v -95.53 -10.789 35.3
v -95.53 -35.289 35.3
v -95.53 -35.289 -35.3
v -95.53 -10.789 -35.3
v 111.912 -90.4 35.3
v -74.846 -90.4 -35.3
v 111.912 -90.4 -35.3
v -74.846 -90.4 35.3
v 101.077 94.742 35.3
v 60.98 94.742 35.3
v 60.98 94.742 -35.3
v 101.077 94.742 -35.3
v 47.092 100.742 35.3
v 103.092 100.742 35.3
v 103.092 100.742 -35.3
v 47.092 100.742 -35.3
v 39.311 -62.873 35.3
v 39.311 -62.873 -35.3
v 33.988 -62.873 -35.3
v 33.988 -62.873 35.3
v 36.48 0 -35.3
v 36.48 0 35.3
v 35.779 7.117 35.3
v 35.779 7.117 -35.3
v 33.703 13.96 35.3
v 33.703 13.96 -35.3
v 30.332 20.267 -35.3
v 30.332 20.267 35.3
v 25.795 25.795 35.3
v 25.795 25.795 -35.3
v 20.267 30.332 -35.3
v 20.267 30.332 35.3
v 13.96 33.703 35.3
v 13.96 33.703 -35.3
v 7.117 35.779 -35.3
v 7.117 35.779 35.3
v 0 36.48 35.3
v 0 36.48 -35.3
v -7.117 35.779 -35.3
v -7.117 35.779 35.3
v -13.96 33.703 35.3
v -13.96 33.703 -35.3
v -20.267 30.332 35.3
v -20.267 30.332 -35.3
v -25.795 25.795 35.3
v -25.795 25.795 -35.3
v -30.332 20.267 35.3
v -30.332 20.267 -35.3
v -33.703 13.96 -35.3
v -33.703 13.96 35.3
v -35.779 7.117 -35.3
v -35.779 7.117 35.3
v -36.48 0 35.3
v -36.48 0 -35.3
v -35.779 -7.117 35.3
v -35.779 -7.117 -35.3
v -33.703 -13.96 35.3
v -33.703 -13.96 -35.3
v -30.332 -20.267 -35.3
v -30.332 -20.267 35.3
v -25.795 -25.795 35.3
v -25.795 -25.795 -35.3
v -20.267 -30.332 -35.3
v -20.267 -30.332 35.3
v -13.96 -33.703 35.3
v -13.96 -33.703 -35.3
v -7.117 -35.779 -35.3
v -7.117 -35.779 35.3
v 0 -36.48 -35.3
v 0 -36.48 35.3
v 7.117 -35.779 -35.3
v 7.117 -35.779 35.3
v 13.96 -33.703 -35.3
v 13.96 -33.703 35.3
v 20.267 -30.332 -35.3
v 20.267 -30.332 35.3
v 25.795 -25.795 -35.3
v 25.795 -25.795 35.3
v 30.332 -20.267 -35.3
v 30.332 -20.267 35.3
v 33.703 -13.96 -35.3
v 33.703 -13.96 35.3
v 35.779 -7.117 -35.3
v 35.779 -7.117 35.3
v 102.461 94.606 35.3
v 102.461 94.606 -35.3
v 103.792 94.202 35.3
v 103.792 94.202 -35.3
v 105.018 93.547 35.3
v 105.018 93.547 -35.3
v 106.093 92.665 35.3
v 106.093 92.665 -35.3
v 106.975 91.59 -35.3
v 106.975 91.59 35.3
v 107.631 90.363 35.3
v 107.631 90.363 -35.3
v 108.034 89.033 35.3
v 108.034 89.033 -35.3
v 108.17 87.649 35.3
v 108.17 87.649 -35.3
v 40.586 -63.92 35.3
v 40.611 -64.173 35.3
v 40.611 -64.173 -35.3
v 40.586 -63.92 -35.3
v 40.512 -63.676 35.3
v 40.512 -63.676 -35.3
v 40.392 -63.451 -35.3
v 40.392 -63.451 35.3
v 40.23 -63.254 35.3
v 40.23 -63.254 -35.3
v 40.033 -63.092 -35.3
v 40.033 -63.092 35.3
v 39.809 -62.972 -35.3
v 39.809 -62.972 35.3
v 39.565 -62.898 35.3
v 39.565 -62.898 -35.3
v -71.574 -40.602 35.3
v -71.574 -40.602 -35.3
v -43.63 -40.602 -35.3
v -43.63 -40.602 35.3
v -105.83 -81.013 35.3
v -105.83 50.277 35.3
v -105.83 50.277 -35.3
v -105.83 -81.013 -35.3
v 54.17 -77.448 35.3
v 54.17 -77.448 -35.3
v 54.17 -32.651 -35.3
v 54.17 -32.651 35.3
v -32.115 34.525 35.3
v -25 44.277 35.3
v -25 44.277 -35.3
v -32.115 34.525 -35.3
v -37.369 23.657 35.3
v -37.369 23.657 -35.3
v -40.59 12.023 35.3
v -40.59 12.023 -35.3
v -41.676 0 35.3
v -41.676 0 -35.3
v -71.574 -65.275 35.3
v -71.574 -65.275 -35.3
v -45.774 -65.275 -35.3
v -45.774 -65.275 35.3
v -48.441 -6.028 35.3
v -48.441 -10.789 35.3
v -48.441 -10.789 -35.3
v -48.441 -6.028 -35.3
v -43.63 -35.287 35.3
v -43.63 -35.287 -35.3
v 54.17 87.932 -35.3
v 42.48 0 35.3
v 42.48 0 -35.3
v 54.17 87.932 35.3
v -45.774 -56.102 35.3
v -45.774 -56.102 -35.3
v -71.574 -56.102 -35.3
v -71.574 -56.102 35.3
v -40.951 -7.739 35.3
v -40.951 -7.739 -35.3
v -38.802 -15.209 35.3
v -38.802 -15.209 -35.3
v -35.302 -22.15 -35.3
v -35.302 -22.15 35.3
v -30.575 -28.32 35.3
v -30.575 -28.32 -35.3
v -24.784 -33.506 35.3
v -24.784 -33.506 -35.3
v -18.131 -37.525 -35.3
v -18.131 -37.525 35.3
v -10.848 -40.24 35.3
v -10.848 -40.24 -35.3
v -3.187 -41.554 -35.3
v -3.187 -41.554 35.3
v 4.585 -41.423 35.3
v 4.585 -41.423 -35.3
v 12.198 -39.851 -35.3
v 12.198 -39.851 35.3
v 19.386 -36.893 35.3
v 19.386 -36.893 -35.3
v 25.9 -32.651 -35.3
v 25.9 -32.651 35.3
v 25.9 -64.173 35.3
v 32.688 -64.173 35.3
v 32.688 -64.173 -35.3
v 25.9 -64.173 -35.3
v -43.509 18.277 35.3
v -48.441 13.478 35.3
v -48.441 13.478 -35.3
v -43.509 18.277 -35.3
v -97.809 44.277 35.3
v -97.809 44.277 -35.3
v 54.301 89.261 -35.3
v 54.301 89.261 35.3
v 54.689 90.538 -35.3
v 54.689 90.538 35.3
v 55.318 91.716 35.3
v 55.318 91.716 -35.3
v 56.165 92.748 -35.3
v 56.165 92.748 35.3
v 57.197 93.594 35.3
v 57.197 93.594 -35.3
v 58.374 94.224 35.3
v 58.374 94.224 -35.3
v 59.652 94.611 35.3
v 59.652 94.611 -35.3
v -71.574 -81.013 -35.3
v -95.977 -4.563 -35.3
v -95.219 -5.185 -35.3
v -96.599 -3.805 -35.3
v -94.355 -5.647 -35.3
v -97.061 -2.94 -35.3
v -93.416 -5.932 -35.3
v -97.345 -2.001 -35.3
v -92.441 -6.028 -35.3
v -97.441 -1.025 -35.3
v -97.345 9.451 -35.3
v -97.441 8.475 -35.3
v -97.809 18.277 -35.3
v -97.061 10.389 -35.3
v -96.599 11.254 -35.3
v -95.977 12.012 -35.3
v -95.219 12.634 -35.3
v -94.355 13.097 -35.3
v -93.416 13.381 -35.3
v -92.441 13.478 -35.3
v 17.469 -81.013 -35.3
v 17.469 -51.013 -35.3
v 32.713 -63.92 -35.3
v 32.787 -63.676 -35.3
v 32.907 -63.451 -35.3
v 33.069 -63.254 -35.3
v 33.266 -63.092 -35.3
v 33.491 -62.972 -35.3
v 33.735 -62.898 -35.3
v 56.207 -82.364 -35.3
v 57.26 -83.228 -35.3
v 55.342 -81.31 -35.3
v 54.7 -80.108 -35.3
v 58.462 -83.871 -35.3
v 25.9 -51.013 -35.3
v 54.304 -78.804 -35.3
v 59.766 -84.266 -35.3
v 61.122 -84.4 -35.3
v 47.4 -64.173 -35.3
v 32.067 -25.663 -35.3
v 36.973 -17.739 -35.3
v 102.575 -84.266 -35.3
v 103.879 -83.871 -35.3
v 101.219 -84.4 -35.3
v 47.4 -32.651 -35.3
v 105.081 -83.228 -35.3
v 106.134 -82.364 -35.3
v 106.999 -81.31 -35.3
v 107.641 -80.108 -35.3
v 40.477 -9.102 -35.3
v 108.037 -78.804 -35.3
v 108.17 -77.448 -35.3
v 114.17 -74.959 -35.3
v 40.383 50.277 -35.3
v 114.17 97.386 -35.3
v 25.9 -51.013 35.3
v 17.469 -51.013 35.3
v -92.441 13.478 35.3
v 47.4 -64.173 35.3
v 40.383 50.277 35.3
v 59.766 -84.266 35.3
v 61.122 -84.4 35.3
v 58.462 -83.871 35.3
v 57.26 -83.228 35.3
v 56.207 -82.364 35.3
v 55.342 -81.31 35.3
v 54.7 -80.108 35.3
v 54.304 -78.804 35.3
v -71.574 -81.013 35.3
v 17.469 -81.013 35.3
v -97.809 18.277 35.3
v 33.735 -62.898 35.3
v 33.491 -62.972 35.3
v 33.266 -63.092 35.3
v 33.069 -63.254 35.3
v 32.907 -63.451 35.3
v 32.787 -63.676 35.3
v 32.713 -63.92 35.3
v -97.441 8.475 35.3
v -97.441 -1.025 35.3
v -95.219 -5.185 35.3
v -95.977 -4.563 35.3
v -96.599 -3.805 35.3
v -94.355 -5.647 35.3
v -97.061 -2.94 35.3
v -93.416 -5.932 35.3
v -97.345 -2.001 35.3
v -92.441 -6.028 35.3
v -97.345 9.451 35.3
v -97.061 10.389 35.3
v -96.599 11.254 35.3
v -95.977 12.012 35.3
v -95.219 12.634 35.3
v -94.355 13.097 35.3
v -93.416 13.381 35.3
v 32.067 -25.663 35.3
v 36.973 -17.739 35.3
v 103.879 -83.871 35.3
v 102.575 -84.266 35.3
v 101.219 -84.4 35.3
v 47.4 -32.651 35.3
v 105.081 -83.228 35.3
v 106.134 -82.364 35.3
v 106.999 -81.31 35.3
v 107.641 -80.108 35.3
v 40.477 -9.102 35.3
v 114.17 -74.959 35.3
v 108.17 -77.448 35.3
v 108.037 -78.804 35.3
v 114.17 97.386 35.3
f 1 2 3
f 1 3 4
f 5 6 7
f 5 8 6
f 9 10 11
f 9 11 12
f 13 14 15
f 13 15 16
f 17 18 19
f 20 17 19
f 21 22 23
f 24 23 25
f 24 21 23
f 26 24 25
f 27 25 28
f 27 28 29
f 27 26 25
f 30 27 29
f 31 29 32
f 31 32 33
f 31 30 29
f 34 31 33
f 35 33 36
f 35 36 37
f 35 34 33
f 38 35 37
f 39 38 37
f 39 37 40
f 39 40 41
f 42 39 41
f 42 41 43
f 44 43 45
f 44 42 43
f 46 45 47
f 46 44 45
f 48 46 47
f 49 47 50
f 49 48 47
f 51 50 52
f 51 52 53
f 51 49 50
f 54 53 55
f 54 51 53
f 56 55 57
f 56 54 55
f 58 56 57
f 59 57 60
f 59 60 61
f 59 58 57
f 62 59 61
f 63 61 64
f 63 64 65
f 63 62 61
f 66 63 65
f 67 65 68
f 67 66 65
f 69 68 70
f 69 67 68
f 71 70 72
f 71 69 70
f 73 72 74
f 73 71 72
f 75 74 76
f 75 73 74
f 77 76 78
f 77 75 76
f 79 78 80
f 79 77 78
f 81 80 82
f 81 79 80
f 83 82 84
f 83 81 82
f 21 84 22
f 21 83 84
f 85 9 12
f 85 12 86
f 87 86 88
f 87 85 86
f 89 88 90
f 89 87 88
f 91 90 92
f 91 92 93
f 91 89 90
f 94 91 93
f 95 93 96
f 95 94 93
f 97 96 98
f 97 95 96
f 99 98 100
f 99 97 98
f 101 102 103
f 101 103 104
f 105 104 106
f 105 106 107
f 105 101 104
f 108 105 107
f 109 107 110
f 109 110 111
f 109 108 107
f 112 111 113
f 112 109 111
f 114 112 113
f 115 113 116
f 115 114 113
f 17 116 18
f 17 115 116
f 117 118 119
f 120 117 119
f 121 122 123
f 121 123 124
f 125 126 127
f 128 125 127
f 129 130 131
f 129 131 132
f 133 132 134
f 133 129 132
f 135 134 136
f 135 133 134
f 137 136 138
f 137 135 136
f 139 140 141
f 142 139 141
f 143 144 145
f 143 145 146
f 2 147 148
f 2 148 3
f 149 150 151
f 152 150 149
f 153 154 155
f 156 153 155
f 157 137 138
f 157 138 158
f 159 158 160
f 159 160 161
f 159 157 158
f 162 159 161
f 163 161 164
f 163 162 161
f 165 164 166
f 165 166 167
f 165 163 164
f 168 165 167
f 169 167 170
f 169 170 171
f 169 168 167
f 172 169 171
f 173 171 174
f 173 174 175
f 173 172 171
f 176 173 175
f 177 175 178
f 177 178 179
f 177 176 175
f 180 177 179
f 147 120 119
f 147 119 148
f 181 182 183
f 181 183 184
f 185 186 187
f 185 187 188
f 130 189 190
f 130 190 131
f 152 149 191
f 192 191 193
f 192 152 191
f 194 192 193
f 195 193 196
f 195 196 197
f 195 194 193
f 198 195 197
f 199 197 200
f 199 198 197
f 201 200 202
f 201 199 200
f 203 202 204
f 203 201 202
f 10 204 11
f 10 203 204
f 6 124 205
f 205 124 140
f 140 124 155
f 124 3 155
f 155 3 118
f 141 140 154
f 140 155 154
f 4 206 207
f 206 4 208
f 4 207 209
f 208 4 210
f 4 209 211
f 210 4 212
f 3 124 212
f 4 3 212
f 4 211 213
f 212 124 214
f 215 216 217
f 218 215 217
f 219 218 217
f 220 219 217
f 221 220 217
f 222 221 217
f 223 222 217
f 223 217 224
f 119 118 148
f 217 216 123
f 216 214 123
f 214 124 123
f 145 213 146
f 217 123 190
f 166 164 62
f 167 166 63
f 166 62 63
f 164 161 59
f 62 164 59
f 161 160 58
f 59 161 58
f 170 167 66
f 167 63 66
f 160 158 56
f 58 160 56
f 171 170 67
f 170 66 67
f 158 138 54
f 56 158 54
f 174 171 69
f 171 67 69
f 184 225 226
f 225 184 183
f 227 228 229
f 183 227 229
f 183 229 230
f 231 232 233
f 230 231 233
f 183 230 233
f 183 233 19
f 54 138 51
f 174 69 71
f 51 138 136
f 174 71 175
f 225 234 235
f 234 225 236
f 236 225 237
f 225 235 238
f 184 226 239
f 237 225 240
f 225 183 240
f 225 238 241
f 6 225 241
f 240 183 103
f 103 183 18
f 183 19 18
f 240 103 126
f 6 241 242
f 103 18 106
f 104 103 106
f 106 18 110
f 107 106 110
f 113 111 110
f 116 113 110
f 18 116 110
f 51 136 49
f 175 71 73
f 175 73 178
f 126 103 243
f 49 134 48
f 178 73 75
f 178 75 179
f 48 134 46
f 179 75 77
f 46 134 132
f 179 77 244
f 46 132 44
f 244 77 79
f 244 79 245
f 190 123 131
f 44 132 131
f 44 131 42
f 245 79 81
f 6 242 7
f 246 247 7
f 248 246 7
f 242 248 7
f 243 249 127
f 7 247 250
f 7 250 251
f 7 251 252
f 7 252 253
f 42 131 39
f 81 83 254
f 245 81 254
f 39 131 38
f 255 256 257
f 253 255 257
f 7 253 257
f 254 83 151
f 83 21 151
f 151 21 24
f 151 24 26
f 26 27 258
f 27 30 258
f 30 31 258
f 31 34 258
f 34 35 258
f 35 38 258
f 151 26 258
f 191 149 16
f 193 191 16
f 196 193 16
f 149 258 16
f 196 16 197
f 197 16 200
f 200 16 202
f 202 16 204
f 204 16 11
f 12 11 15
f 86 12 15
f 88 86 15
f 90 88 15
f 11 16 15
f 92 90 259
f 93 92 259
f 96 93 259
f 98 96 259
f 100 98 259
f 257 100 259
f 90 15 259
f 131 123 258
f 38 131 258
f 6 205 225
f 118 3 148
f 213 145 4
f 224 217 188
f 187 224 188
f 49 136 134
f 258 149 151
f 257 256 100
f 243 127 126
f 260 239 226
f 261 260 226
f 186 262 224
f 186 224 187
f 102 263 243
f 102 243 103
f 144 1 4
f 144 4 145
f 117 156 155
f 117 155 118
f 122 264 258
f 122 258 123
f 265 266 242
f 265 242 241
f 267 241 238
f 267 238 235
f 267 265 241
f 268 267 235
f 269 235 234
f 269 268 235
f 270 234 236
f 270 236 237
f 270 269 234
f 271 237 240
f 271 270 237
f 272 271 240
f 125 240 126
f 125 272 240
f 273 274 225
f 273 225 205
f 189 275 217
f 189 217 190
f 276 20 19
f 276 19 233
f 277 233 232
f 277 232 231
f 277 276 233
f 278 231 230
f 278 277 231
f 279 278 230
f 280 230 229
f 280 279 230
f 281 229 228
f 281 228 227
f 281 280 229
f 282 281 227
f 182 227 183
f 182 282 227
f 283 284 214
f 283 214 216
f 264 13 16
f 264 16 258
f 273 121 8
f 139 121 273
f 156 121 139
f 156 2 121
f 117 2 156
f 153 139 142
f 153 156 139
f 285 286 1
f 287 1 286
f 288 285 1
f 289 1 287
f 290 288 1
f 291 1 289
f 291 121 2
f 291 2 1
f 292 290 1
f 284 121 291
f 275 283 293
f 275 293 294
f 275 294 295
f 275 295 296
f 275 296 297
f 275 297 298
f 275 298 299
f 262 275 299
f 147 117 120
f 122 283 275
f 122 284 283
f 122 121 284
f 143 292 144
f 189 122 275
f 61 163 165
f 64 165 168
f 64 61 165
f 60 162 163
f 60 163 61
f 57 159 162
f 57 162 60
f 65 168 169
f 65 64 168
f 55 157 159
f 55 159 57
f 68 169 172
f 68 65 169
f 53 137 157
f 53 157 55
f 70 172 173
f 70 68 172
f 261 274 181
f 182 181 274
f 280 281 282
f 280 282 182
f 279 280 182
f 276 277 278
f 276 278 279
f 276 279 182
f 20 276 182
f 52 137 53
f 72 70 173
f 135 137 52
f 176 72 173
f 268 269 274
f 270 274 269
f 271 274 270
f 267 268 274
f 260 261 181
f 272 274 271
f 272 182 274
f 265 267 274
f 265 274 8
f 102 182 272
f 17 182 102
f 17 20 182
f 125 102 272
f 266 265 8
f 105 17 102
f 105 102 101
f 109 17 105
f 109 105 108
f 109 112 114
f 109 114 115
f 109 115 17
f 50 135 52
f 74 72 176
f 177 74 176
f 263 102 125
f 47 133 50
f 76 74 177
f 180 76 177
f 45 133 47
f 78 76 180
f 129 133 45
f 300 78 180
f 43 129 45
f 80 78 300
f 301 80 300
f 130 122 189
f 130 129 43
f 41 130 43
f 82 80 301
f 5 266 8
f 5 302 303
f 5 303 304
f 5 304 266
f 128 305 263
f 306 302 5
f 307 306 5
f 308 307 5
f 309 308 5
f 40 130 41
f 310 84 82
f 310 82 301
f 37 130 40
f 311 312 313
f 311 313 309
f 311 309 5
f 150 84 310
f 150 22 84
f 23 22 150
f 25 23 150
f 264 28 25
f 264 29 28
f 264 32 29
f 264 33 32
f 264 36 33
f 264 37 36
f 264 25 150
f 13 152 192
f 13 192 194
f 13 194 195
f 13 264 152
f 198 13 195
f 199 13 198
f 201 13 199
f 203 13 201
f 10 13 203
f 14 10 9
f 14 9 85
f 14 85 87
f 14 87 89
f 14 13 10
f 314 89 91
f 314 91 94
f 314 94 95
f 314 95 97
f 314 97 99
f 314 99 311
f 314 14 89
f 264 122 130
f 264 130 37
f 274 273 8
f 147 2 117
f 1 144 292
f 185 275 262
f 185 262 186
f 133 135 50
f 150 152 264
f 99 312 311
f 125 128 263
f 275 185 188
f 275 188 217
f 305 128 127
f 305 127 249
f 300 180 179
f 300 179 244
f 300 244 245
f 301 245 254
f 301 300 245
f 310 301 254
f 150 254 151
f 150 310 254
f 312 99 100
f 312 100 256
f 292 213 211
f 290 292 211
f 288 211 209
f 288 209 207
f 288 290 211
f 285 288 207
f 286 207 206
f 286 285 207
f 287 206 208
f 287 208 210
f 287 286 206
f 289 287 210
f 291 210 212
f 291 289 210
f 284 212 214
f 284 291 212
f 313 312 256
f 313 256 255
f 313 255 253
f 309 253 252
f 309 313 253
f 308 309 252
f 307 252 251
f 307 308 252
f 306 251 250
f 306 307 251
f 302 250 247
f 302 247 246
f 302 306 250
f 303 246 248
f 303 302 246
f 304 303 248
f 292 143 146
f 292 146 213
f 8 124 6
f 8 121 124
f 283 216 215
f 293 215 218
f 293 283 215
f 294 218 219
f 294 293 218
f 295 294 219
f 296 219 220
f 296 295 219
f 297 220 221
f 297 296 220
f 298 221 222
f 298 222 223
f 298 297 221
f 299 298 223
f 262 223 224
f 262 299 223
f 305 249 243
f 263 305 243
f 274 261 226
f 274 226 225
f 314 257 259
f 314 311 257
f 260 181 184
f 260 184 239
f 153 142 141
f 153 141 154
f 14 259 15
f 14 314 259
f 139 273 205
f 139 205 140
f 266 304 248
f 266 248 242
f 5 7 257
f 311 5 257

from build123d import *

# Parameters (mm, degrees)
CROQUIS1_R              = 36.48
SALIENTE_EXTRUIR1_DEPTH = 35.3


with BuildPart() as part:
    # Croquis1 → Saliente-Extruir1 (new, symmetric)
    with BuildSketch(Plane.XY):
        Polygon((114.170497813, 97.385634303), (103.092241408, 100.742040907), (47.092241408, 100.742040907), (40.383016369, 50.277319492), (-25, 50.277319492), (-105.829502187, 50.277319492), (-105.829502187, -81.012611613), (-74.846281109, -90.399674345), (111.911647615, -90.399674345), (114.170497813, -74.959018563), align=None)
        Circle(CROQUIS1_R, mode=Mode.SUBTRACT)
        with BuildLine():
            Line((39.311090941, -62.873407285), (33.988381842, -62.873407285))
            ThreePointArc((33.988381842, -62.873407285), (33.069143027, -63.25416847), (32.688381842, -64.173407285))
            Line((32.688381842, -64.173407285), (25.899736392, -64.173407285))
            Line((25.899736392, -64.173407285), (25.899736392, -51.012611613))
            Line((25.899736392, -51.012611613), (17.468766423, -51.012611613))
            Line((17.468766423, -51.012611613), (17.468766423, -64.173407285))
            Line((17.468766423, -64.173407285), (17.468766423, -81.012611613))
            Line((17.468766423, -81.012611613), (-71.573973225, -81.012611613))
            Line((-71.573973225, -81.012611613), (-71.573973225, -65.27493481))
            Line((-71.573973225, -65.27493481), (-45.773973225, -65.27493481))
            Line((-45.773973225, -65.27493481), (-45.773973225, -56.101811779))
            Line((-45.773973225, -56.101811779), (-71.573973225, -56.101811779))
            Line((-71.573973225, -56.101811779), (-71.573973225, -40.601811779))
            Line((-71.573973225, -40.601811779), (-43.629552583, -40.601811779))
            Line((-43.629552583, -40.601811779), (-43.629552583, -35.286923245))
            Line((-43.629552583, -35.286923245), (-95.529552548, -35.288826129))
            Line((-95.529552548, -35.288826129), (-95.530450826, -10.788826145))
            Line((-95.530450826, -10.788826145), (-48.440569068, -10.788826145))
            Line((-48.440569068, -10.788826145), (-48.440569068, -6.028234661))
            Line((-48.440569068, -6.028234661), (-92.440569068, -6.028234661))
            ThreePointArc((-92.440569068, -6.028234661), (-95.977129578, -4.562741665), (-97.440568225, -1.025330565))
            Line((-97.440568225, -1.025330565), (-97.440568225, 8.474669435))
            ThreePointArc((-97.440568225, 8.474669435), (-95.977129578, 12.012080534), (-92.440569068, 13.47757353))
            Line((-92.440569068, 13.47757353), (-48.440569068, 13.47757353))
            Line((-48.440569068, 13.47757353), (-43.508684083, 18.277319492))
            Line((-43.508684083, 18.277319492), (-97.808684083, 18.277319492))
            Line((-97.808684083, 18.277319492), (-97.808684083, 44.277319492))
            Line((-97.808684083, 44.277319492), (-25, 44.277319492))
            ThreePointArc((-25, 44.277319492), (-37.368804618, 23.656765735), (-41.676007876, 0))
            ThreePointArc((-41.676007876, 0), (-18.131354261, -37.525239842), (25.899736392, -32.651084015))
            ThreePointArc((25.899736392, -32.651084015), (36.972896923, -17.738767673), (42.48, 0))
            Line((42.48, 0), (54.170497813, 87.932318843))
            ThreePointArc((54.170497813, 87.932318843), (56.165019227, 92.747519492), (60.980219877, 94.742040907))
            Line((60.980219877, 94.742040907), (101.077345244, 94.742040907))
            ThreePointArc((101.077345244, 94.742040907), (106.092961526, 92.664504619), (108.170497813, 87.648888338))
            Line((108.170497813, 87.648888338), (108.170497813, -77.448237029))
            ThreePointArc((108.170497813, -77.448237029), (106.134468962, -82.363645495), (101.219060497, -84.399674345))
            Line((101.219060497, -84.399674345), (61.121935129, -84.399674345))
            ThreePointArc((61.121935129, -84.399674345), (56.206526664, -82.363645495), (54.170497813, -77.448237029))
            Line((54.170497813, -77.448237029), (54.170497813, -32.651084015))
            Line((54.170497813, -32.651084015), (47.399736392, -32.651084015))
            Line((47.399736392, -32.651084015), (47.399736392, -64.173407285))
            Line((47.399736392, -64.173407285), (40.611090941, -64.173407285))
            ThreePointArc((40.611090941, -64.173407285), (40.230329756, -63.25416847), (39.311090941, -62.873407285))
        make_face(mode=Mode.SUBTRACT)
    extrude(amount=SALIENTE_EXTRUIR1_DEPTH, both=True)


solid = part.part
